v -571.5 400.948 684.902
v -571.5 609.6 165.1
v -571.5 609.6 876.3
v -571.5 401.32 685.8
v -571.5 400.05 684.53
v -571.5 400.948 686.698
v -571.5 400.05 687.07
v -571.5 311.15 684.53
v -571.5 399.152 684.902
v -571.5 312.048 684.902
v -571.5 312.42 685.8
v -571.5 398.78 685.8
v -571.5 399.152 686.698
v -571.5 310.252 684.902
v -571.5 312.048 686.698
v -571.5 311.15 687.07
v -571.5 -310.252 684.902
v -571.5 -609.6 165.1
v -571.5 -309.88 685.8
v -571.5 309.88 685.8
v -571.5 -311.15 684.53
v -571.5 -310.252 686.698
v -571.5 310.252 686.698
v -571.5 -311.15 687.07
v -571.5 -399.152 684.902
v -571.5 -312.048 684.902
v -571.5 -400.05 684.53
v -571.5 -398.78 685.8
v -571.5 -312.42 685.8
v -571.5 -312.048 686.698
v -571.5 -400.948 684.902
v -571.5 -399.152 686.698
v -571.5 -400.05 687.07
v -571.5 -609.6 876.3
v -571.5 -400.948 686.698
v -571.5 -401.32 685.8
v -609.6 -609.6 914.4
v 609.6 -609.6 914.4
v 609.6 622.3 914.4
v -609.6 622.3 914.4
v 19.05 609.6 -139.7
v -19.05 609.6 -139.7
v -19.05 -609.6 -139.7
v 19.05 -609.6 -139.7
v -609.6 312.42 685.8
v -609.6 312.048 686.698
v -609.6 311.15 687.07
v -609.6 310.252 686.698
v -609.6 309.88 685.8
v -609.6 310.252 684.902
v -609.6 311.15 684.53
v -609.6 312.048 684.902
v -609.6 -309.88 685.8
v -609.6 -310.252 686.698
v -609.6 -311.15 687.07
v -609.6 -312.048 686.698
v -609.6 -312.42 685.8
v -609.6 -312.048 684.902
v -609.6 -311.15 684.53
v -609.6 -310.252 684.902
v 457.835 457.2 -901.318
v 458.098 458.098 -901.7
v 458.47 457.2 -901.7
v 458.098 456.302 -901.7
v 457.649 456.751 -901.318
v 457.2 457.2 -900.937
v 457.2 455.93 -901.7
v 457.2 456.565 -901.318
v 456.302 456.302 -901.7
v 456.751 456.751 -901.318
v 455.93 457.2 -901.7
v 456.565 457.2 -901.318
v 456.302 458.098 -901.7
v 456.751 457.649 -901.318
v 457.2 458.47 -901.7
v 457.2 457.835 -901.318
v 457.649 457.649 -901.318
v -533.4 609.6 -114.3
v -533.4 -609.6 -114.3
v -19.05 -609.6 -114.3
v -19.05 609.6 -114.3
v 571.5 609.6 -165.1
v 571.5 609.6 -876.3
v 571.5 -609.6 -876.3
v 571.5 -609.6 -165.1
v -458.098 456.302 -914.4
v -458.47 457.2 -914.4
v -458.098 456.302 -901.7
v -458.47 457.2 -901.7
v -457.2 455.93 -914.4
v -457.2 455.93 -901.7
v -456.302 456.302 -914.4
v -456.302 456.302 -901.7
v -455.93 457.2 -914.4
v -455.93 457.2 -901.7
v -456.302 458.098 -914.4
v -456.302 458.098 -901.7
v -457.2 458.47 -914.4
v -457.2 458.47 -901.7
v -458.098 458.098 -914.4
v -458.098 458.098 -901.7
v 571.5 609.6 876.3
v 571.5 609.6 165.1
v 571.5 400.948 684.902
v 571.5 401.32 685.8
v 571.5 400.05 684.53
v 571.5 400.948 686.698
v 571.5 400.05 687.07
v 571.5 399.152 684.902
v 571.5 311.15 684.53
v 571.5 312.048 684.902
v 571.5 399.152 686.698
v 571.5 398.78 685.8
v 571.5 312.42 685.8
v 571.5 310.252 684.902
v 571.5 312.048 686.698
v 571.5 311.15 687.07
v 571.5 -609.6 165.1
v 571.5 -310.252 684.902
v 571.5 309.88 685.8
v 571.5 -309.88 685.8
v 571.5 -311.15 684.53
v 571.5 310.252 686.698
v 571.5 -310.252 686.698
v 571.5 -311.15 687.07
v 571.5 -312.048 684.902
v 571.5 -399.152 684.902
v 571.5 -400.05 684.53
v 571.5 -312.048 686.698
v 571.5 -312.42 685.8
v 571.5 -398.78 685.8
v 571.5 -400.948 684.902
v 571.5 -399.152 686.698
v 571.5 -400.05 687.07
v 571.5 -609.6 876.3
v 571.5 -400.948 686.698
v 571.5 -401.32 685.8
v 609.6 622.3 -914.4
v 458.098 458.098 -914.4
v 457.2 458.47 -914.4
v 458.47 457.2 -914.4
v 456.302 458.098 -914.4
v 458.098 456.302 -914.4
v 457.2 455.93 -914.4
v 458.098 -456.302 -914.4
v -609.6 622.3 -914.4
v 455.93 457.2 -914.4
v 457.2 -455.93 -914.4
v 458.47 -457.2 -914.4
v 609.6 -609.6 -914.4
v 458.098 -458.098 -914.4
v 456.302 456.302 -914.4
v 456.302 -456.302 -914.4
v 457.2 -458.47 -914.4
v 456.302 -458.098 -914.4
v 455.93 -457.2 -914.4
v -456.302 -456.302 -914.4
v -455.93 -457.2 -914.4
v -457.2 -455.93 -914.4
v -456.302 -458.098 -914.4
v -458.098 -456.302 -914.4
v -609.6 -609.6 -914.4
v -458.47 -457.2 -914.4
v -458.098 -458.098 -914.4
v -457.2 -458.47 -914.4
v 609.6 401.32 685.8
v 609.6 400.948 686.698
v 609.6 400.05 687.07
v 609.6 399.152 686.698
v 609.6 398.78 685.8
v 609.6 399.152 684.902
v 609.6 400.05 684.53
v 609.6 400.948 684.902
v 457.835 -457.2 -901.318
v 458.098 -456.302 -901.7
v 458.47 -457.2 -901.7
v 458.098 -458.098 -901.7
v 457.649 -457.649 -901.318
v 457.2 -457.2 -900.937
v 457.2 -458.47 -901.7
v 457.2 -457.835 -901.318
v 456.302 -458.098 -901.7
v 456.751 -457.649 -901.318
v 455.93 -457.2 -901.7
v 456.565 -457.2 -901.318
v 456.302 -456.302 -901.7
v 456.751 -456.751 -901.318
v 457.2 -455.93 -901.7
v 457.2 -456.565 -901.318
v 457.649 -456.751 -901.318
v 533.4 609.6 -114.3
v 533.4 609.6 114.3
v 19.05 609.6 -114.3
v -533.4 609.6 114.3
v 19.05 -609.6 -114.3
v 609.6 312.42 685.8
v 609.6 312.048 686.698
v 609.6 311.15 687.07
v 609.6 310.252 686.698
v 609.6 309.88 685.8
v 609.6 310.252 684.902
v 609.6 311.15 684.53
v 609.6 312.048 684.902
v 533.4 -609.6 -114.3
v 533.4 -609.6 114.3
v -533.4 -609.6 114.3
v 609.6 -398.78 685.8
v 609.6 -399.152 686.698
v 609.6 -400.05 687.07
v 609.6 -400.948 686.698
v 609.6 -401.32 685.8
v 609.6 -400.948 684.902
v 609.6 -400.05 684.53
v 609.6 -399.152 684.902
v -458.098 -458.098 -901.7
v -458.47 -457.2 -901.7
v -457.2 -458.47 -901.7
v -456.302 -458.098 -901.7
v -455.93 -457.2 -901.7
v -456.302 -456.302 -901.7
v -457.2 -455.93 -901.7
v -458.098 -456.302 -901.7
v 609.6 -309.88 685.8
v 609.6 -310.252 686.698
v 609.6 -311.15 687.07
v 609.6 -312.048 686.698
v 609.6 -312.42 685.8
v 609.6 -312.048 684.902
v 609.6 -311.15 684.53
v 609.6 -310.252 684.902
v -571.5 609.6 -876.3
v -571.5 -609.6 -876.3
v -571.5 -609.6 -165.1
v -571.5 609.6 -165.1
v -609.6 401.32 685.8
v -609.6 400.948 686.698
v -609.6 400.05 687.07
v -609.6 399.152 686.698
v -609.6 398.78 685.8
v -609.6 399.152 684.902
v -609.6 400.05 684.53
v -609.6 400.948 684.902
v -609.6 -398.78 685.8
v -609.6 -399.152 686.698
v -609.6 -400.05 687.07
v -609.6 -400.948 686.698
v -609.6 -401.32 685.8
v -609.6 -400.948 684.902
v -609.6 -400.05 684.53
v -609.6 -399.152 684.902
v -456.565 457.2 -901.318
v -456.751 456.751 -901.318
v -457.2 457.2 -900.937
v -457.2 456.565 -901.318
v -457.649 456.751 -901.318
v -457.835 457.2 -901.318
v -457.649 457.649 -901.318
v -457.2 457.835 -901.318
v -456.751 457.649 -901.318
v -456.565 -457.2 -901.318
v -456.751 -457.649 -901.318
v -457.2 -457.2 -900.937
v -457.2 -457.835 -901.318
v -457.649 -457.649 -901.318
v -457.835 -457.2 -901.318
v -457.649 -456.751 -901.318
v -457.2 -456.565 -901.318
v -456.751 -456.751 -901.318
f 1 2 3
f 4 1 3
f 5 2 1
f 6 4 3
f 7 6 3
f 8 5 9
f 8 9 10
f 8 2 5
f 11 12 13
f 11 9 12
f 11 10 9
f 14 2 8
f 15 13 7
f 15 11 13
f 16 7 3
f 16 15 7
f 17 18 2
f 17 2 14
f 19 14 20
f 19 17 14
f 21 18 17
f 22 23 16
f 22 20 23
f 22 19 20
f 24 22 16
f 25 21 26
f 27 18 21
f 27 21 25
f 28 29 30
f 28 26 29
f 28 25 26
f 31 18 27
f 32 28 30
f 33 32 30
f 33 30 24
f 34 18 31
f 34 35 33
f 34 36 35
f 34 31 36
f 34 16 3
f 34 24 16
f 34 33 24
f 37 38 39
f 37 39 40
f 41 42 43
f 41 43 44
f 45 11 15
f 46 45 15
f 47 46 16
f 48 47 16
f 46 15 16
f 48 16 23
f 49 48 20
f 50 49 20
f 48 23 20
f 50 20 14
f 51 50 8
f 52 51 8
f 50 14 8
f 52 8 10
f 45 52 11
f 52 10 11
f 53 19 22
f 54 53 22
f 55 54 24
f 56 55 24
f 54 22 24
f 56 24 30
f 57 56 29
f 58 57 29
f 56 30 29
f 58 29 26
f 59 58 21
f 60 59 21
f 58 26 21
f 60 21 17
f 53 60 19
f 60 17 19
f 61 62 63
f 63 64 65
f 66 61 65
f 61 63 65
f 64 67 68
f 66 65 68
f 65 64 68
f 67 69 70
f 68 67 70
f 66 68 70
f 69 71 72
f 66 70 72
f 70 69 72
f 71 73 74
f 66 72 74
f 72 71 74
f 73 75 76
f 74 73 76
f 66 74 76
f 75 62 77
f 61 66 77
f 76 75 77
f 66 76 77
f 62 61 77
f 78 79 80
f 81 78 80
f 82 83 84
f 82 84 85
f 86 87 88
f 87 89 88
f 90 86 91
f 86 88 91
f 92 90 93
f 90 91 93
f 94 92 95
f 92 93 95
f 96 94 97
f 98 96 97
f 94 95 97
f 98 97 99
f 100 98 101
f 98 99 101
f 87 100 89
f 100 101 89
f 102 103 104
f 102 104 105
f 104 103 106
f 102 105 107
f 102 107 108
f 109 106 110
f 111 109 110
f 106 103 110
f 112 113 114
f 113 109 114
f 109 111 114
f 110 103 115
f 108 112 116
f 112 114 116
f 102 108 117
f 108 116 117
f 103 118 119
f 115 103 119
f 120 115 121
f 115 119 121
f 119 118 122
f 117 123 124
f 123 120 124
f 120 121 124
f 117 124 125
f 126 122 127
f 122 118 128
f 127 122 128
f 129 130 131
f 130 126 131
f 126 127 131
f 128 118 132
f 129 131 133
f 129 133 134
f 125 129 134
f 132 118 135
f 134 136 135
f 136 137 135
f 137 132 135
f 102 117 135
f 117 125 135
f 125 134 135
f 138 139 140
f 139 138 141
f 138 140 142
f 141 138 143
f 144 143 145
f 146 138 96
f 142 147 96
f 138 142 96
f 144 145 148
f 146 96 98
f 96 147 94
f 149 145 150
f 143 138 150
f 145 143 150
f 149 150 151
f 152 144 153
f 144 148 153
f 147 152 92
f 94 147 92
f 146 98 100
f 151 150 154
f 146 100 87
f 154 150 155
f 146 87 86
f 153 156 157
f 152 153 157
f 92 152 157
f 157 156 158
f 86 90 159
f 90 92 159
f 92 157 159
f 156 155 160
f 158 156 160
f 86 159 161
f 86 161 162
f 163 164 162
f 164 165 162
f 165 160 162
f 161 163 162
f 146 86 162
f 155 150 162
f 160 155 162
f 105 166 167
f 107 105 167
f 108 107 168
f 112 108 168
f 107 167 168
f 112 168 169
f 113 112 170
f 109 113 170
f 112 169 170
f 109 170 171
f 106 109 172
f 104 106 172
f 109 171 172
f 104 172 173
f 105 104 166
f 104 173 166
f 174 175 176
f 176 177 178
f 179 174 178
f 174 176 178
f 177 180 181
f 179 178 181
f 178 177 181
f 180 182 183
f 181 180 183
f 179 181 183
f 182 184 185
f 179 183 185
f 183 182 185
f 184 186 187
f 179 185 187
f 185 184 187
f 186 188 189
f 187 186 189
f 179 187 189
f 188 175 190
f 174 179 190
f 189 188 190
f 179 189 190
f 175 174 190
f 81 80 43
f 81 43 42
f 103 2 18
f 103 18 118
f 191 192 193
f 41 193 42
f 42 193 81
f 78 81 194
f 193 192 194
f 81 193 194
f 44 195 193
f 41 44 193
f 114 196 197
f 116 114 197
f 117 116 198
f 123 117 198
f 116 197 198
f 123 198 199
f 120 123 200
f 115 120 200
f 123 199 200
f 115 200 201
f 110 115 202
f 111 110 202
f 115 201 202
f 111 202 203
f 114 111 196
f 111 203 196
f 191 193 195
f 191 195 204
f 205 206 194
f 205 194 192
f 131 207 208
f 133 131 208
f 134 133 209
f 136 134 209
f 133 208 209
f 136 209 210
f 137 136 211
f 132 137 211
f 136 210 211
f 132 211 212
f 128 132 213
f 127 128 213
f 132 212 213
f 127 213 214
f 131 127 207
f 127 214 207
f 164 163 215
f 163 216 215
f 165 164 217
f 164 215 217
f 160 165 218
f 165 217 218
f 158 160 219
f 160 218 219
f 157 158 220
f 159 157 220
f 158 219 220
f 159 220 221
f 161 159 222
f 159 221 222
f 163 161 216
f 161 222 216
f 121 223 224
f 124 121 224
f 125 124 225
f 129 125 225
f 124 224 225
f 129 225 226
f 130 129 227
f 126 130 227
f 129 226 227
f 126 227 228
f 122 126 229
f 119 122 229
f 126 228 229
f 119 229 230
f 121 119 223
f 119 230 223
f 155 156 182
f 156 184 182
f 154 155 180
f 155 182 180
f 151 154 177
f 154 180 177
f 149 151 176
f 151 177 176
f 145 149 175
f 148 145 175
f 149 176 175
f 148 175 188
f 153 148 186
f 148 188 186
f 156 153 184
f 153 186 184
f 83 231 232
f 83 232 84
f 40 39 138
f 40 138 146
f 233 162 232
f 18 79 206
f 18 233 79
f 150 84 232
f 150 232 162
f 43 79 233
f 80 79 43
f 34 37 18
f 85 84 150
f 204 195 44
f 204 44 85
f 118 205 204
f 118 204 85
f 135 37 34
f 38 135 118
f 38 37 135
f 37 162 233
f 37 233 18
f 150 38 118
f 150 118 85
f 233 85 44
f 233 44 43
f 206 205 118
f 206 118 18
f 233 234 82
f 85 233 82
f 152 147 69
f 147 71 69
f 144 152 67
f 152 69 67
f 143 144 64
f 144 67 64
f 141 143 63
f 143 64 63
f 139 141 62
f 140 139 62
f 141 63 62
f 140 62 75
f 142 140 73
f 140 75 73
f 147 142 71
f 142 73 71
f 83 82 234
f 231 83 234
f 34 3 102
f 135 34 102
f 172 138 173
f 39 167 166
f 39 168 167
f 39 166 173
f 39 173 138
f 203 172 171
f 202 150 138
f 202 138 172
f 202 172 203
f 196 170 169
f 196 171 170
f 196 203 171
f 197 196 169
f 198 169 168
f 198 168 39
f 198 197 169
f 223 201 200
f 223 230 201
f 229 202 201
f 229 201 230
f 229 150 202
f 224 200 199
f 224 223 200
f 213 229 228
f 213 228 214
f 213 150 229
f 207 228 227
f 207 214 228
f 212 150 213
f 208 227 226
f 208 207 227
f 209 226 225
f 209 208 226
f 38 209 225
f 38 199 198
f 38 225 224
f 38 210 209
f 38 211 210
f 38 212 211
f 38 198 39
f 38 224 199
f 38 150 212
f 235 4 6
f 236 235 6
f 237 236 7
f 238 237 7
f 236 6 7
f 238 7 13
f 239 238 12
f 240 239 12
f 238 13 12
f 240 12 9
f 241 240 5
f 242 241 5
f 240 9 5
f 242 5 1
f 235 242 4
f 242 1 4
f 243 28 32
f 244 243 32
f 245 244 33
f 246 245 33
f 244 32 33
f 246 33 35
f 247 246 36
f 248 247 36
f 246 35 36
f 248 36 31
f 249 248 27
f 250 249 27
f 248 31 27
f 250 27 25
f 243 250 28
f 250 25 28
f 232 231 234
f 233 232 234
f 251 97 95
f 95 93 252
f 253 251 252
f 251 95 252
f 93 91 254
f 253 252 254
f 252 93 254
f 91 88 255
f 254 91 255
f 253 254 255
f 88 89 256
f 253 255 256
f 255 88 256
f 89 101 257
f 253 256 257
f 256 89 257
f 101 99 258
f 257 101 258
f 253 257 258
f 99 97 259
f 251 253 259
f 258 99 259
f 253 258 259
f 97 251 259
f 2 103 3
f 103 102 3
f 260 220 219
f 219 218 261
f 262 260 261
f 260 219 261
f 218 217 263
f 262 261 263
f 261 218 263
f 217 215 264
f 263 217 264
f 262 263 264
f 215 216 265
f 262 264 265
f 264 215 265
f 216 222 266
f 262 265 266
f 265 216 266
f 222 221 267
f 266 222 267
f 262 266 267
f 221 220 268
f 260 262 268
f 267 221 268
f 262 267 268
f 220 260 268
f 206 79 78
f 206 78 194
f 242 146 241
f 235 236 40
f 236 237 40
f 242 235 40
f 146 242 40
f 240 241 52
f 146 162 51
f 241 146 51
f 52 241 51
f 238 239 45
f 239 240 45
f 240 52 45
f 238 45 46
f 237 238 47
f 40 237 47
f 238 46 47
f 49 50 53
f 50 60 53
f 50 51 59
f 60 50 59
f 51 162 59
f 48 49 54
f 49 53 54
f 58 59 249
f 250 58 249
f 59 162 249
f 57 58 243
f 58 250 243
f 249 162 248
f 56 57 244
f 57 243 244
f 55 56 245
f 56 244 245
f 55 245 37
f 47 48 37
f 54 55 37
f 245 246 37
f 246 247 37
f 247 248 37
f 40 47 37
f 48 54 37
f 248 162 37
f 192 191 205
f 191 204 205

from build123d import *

# Parameters (mm, degrees)
F0_W     = 1219.2
F0_H     = 1828.8
F0_W_2   = 1143
F0_H_2   = 711.2
F0_W_3   = 1066.8
F0_H_3   = 228.6
F1_DEPTH = 609.6
F2_W     = 1219.2
F2_H     = 1828.8
F3_DEPTH = 12.7
F5_D     = 2.54
F7_D     = 2.54
F7_DEPTH = 12.7
F7_TIP   = 0.7630929862
F8_W     = 38.1
F8_H     = 1219.2
F9_DEPTH = 25.4


# Not quite as in the source:
# - a feature names something its author has since deleted; it is built from what else it names


with BuildPart() as f1:
    # F0 (on Front) → F1 (new body, symmetric)
    with BuildSketch(Plane.XZ):
        Rectangle(F0_W, F0_H)
        with Locations((0, -520.7)):
            Rectangle(F0_W_2, F0_H_2, mode=Mode.SUBTRACT)
        Rectangle(F0_W_3, F0_H_3, mode=Mode.SUBTRACT)
        with Locations((0, 520.7)):
            Rectangle(F0_W_2, F0_H_2, mode=Mode.SUBTRACT)
    extrude(amount=F1_DEPTH, both=True)

    # F2 (on face) → F3 (join)
    with BuildSketch(Plane(origin=(0, 609.6, 0), x_dir=(-1, 0, 0), z_dir=(0, 1, 0))):
        Rectangle(F2_W, F2_H)
    extrude(amount=F3_DEPTH)

    # F5 (through all)
    with Locations(Plane(origin=(-609.6, 0, 0), x_dir=(0, -1, 0), z_dir=(-1, 0, 0))):
        with Locations((-400.05, 685.8), (-311.15, 685.8), (311.15, 685.8), (400.05, 685.8)):
            Hole(F5_D / 2)

    # F7
    with Locations(Plane(origin=(0, 0, -914.4), x_dir=(1, 0, 0), z_dir=(0, 0, -1))):
        with Locations((-457.2, 457.2), (457.2, 457.2), (457.2, -457.2), (-457.2, -457.2)):
            Hole(F7_D / 2, depth=F7_DEPTH)
            with Locations((0, 0, -(F7_DEPTH + F7_TIP / 2))):  # 118° drill point
                Cone(0, F7_D / 2, F7_TIP, mode=Mode.SUBTRACT)

    # F8 (on face) → F9 (cut)
    with BuildSketch(Plane.XY.offset(-114.3)):
        Rectangle(F8_W, F8_H)
    extrude(amount=-F9_DEPTH, mode=Mode.SUBTRACT)


solid = f1.part
